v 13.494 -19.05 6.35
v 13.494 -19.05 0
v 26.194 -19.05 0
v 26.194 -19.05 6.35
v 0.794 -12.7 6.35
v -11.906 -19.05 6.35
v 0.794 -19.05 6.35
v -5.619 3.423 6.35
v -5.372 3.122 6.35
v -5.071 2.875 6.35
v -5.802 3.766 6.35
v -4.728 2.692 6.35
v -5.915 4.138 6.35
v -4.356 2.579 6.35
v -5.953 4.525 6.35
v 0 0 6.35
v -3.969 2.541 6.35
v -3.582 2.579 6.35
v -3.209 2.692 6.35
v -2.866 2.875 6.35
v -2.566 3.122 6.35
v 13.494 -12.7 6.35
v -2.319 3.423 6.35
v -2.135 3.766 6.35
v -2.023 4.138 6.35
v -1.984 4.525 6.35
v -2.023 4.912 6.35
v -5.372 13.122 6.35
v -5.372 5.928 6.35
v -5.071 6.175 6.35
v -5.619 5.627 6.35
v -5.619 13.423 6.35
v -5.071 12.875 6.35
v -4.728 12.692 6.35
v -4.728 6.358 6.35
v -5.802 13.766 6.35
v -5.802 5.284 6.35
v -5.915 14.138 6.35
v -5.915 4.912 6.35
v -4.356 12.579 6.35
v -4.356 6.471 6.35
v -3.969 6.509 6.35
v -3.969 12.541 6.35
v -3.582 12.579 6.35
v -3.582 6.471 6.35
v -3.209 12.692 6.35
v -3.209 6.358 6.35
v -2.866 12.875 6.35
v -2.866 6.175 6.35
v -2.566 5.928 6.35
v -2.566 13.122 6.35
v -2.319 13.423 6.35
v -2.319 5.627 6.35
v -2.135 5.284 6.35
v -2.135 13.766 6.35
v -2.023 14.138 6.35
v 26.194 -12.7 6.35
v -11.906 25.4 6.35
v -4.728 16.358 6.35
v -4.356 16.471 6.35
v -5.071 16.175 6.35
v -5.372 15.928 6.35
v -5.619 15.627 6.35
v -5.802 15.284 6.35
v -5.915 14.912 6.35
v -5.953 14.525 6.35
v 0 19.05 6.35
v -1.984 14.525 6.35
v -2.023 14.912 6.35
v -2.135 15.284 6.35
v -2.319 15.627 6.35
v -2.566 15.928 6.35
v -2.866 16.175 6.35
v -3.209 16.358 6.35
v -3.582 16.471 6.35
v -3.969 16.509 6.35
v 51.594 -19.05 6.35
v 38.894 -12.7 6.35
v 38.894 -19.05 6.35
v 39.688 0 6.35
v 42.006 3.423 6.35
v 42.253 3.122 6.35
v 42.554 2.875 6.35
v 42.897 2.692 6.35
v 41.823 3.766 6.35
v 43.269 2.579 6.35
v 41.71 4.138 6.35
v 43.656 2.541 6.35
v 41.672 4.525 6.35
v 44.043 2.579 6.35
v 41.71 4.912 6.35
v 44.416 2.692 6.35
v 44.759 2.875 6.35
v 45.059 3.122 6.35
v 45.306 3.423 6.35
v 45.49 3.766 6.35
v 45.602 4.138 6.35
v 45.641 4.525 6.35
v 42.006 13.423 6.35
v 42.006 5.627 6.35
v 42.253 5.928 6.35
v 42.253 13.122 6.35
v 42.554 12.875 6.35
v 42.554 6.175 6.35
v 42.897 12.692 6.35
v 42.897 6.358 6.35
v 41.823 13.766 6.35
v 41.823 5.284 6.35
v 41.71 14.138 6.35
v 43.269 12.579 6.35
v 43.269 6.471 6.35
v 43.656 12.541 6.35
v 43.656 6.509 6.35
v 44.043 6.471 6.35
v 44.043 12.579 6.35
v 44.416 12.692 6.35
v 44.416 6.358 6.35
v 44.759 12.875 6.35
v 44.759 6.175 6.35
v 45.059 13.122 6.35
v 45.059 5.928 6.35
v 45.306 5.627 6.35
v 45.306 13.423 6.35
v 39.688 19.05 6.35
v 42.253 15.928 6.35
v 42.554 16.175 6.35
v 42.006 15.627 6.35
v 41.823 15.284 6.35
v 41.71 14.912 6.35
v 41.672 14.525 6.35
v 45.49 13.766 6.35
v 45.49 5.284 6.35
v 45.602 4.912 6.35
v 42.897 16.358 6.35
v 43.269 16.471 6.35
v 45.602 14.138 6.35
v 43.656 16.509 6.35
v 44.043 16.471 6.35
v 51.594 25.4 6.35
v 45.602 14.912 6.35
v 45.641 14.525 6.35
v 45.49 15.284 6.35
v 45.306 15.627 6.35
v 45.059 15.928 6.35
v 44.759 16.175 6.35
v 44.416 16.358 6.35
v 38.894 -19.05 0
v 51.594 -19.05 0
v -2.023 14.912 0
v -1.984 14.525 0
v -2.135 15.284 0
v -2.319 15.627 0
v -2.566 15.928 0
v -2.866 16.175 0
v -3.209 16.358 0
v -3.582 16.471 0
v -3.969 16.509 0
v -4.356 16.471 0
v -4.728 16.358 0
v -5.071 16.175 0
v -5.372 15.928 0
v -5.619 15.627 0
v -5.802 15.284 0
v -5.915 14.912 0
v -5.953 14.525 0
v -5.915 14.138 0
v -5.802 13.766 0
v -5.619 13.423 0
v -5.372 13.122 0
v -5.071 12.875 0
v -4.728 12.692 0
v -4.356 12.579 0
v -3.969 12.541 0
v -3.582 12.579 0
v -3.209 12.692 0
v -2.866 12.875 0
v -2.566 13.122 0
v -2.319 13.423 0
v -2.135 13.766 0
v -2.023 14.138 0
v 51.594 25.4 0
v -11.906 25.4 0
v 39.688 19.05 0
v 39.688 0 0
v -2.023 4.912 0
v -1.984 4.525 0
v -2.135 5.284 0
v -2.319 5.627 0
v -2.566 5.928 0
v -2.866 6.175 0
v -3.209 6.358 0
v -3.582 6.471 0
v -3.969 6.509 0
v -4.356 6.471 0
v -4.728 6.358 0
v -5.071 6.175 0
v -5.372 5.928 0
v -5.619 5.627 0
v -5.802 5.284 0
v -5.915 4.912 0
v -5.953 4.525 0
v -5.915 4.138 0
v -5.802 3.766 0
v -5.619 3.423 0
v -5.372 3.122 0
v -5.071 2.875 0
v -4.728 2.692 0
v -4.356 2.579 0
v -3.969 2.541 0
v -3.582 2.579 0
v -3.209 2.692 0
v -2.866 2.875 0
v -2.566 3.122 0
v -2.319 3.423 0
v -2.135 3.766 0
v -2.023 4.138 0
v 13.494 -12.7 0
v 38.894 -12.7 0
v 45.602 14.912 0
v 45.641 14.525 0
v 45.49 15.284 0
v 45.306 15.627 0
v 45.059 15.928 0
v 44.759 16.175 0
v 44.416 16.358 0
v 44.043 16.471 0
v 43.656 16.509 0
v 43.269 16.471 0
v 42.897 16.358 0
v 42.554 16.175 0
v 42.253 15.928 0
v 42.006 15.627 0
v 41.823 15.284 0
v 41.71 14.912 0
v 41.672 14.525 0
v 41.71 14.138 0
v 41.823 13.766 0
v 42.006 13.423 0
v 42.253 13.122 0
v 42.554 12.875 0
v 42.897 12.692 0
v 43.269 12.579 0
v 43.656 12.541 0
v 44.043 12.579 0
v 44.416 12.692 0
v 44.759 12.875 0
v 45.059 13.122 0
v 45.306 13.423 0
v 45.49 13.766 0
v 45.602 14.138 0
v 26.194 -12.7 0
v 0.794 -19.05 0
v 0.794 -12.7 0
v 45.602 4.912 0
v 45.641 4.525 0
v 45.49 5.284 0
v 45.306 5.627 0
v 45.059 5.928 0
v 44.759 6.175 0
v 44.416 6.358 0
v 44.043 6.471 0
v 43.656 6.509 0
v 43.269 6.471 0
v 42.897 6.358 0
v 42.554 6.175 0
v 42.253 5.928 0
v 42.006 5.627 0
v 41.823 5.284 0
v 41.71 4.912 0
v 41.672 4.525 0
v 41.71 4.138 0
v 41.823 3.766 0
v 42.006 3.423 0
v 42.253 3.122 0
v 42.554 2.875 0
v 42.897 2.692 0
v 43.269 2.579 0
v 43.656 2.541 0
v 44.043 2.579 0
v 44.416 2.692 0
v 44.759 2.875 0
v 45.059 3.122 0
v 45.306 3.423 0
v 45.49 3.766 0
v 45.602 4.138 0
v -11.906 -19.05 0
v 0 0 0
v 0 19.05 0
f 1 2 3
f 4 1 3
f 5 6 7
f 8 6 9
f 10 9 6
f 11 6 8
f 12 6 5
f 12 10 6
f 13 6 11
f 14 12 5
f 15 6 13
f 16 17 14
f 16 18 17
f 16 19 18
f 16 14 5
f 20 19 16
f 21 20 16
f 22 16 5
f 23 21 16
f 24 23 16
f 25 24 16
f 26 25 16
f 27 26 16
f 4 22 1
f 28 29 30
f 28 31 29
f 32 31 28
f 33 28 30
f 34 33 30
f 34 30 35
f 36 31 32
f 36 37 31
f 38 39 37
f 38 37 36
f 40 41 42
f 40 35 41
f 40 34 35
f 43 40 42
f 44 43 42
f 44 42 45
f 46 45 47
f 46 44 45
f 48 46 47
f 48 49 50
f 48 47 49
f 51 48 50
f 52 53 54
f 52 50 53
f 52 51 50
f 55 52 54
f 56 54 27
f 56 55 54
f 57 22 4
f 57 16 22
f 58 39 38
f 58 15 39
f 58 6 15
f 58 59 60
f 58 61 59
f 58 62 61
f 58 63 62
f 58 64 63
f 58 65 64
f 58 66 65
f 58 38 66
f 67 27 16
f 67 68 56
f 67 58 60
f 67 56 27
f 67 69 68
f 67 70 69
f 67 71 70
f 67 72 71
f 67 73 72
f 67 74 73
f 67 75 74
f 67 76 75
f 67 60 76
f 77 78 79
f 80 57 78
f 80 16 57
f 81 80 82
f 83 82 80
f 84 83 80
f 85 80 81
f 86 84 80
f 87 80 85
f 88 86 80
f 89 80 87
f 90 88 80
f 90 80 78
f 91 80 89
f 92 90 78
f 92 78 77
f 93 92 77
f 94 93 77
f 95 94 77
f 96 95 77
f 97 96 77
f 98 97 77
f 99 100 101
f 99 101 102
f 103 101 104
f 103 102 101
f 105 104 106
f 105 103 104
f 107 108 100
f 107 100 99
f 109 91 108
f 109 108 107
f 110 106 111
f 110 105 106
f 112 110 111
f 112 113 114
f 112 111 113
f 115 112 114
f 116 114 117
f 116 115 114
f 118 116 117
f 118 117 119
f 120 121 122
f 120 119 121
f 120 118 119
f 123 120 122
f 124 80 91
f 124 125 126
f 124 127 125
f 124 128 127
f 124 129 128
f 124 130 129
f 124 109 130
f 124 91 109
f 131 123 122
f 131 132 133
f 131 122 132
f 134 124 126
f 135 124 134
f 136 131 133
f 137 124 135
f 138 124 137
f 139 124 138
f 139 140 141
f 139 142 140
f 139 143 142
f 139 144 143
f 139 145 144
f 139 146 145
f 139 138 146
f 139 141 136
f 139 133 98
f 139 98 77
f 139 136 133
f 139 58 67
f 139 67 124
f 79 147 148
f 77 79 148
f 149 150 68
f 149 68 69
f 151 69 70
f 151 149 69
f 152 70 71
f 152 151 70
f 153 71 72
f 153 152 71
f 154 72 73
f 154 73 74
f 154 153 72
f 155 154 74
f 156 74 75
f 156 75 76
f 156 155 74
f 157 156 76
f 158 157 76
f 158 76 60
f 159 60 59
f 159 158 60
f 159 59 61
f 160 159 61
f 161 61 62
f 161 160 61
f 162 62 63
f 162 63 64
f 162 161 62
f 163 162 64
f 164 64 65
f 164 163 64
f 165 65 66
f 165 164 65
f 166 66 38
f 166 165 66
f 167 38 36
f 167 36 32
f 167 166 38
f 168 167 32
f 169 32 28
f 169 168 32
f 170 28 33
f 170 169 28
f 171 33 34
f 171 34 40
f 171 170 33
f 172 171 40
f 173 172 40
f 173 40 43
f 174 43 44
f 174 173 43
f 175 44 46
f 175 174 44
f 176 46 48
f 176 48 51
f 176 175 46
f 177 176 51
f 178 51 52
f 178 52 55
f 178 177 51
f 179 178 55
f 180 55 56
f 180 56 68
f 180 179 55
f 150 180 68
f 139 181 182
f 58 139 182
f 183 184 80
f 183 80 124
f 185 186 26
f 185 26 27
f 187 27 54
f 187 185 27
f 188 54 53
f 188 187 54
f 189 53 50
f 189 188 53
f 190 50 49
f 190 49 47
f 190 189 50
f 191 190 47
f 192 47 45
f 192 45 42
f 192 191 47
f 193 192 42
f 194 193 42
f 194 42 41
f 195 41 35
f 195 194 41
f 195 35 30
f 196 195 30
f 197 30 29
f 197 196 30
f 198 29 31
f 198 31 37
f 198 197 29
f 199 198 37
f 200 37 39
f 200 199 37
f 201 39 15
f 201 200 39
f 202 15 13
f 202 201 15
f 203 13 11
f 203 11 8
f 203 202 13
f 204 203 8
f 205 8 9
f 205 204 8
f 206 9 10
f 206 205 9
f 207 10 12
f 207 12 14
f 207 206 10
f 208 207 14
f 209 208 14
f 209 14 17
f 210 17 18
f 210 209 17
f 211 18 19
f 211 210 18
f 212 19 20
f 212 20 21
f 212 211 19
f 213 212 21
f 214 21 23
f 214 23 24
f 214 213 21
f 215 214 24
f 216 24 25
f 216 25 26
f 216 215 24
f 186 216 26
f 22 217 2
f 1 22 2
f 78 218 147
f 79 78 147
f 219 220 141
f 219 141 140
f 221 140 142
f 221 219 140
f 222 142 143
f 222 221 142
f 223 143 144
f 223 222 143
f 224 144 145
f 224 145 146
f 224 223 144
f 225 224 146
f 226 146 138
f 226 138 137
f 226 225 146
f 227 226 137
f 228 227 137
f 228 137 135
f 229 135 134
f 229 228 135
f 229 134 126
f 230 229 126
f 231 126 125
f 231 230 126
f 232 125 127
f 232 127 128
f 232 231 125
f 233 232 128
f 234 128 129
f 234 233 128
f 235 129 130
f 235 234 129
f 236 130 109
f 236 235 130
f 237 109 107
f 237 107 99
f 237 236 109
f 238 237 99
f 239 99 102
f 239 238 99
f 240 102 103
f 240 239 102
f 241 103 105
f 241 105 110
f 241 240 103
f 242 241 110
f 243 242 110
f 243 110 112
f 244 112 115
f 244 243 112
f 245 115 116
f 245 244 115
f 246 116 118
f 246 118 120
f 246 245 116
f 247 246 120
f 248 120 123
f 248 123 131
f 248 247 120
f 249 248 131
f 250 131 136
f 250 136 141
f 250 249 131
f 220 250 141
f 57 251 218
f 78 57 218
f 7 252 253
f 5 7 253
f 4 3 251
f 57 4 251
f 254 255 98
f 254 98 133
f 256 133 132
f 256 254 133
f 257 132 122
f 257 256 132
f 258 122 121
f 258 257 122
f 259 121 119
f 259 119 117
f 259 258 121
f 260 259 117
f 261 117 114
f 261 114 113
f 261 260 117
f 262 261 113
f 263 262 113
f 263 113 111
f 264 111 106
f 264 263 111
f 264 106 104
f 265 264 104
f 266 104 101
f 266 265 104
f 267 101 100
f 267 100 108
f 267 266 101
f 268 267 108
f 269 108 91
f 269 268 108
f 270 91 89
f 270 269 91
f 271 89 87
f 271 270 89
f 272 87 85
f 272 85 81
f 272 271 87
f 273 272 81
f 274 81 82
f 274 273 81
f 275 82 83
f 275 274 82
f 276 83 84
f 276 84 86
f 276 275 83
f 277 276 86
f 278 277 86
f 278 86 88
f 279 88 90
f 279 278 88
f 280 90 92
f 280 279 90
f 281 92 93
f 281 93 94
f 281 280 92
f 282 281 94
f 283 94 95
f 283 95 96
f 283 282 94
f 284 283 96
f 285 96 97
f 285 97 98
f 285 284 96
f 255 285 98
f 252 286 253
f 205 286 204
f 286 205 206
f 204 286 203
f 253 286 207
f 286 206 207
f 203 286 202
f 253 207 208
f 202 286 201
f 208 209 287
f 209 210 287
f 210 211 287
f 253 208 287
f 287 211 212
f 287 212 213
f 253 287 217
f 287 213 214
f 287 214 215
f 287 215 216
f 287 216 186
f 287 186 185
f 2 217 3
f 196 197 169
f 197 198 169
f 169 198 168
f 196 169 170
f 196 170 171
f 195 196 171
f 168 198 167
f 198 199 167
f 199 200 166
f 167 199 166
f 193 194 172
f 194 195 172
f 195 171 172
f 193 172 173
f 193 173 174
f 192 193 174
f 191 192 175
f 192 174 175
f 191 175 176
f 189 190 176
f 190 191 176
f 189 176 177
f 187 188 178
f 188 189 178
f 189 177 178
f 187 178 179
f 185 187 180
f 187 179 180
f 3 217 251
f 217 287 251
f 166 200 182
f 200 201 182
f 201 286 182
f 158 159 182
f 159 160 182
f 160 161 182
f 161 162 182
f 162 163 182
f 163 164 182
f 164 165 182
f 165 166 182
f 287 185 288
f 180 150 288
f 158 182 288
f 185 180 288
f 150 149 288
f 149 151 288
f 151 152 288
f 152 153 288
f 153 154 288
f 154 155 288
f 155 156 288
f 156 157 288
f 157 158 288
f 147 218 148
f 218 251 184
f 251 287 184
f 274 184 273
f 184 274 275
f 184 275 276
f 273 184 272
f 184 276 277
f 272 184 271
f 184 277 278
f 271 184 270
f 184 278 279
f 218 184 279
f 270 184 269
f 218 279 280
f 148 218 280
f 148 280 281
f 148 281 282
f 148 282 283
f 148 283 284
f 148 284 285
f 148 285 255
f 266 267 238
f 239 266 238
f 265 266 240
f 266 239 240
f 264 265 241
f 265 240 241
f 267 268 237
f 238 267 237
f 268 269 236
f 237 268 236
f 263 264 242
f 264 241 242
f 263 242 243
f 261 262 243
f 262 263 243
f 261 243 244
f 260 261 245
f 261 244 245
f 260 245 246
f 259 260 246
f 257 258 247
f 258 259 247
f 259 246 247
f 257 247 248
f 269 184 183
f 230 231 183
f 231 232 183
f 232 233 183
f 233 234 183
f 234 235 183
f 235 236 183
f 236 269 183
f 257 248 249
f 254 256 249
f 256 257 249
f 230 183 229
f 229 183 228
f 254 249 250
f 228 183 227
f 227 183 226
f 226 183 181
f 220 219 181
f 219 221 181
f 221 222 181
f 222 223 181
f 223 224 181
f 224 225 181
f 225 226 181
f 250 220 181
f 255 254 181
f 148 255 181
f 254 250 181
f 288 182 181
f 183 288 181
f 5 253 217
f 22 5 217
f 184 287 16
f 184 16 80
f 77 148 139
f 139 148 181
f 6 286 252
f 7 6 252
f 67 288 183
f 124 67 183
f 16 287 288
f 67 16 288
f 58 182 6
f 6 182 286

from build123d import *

# Parameters (mm, degrees)
SKETCH2_R           = 1.984375
SKETCH2_W           = 39.6875
SKETCH2_H           = 19.05
BOSS_EXTRUDE1_DEPTH = 6.35


with BuildPart() as part:
    # Sketch2 → Boss-Extrude1 (new body)
    with BuildSketch(Plane.XY):
        Polygon((51.59375, 25.4), (-11.90625, 25.4), (-11.90625, -19.05), (0.79375, -19.05), (0.79375, -12.7), (13.49375, -12.7), (13.49375, -19.05), (26.19375, -19.05), (26.19375, -12.7), (38.89375, -12.7), (38.89375, -19.05), (51.59375, -19.05), align=None)
        with Locations((-3.96875, 4.525)):
            Circle(SKETCH2_R, mode=Mode.SUBTRACT)
        with Locations((-3.96875, 14.525)):
            Circle(SKETCH2_R, mode=Mode.SUBTRACT)
        with Locations((19.84375, 9.525)):
            Rectangle(SKETCH2_W, SKETCH2_H, mode=Mode.SUBTRACT)
        with Locations((43.65625, 4.525)):
            Circle(SKETCH2_R, mode=Mode.SUBTRACT)
        with Locations((43.65625, 14.525)):
            Circle(SKETCH2_R, mode=Mode.SUBTRACT)
    extrude(amount=BOSS_EXTRUDE1_DEPTH)


solid = part.part
